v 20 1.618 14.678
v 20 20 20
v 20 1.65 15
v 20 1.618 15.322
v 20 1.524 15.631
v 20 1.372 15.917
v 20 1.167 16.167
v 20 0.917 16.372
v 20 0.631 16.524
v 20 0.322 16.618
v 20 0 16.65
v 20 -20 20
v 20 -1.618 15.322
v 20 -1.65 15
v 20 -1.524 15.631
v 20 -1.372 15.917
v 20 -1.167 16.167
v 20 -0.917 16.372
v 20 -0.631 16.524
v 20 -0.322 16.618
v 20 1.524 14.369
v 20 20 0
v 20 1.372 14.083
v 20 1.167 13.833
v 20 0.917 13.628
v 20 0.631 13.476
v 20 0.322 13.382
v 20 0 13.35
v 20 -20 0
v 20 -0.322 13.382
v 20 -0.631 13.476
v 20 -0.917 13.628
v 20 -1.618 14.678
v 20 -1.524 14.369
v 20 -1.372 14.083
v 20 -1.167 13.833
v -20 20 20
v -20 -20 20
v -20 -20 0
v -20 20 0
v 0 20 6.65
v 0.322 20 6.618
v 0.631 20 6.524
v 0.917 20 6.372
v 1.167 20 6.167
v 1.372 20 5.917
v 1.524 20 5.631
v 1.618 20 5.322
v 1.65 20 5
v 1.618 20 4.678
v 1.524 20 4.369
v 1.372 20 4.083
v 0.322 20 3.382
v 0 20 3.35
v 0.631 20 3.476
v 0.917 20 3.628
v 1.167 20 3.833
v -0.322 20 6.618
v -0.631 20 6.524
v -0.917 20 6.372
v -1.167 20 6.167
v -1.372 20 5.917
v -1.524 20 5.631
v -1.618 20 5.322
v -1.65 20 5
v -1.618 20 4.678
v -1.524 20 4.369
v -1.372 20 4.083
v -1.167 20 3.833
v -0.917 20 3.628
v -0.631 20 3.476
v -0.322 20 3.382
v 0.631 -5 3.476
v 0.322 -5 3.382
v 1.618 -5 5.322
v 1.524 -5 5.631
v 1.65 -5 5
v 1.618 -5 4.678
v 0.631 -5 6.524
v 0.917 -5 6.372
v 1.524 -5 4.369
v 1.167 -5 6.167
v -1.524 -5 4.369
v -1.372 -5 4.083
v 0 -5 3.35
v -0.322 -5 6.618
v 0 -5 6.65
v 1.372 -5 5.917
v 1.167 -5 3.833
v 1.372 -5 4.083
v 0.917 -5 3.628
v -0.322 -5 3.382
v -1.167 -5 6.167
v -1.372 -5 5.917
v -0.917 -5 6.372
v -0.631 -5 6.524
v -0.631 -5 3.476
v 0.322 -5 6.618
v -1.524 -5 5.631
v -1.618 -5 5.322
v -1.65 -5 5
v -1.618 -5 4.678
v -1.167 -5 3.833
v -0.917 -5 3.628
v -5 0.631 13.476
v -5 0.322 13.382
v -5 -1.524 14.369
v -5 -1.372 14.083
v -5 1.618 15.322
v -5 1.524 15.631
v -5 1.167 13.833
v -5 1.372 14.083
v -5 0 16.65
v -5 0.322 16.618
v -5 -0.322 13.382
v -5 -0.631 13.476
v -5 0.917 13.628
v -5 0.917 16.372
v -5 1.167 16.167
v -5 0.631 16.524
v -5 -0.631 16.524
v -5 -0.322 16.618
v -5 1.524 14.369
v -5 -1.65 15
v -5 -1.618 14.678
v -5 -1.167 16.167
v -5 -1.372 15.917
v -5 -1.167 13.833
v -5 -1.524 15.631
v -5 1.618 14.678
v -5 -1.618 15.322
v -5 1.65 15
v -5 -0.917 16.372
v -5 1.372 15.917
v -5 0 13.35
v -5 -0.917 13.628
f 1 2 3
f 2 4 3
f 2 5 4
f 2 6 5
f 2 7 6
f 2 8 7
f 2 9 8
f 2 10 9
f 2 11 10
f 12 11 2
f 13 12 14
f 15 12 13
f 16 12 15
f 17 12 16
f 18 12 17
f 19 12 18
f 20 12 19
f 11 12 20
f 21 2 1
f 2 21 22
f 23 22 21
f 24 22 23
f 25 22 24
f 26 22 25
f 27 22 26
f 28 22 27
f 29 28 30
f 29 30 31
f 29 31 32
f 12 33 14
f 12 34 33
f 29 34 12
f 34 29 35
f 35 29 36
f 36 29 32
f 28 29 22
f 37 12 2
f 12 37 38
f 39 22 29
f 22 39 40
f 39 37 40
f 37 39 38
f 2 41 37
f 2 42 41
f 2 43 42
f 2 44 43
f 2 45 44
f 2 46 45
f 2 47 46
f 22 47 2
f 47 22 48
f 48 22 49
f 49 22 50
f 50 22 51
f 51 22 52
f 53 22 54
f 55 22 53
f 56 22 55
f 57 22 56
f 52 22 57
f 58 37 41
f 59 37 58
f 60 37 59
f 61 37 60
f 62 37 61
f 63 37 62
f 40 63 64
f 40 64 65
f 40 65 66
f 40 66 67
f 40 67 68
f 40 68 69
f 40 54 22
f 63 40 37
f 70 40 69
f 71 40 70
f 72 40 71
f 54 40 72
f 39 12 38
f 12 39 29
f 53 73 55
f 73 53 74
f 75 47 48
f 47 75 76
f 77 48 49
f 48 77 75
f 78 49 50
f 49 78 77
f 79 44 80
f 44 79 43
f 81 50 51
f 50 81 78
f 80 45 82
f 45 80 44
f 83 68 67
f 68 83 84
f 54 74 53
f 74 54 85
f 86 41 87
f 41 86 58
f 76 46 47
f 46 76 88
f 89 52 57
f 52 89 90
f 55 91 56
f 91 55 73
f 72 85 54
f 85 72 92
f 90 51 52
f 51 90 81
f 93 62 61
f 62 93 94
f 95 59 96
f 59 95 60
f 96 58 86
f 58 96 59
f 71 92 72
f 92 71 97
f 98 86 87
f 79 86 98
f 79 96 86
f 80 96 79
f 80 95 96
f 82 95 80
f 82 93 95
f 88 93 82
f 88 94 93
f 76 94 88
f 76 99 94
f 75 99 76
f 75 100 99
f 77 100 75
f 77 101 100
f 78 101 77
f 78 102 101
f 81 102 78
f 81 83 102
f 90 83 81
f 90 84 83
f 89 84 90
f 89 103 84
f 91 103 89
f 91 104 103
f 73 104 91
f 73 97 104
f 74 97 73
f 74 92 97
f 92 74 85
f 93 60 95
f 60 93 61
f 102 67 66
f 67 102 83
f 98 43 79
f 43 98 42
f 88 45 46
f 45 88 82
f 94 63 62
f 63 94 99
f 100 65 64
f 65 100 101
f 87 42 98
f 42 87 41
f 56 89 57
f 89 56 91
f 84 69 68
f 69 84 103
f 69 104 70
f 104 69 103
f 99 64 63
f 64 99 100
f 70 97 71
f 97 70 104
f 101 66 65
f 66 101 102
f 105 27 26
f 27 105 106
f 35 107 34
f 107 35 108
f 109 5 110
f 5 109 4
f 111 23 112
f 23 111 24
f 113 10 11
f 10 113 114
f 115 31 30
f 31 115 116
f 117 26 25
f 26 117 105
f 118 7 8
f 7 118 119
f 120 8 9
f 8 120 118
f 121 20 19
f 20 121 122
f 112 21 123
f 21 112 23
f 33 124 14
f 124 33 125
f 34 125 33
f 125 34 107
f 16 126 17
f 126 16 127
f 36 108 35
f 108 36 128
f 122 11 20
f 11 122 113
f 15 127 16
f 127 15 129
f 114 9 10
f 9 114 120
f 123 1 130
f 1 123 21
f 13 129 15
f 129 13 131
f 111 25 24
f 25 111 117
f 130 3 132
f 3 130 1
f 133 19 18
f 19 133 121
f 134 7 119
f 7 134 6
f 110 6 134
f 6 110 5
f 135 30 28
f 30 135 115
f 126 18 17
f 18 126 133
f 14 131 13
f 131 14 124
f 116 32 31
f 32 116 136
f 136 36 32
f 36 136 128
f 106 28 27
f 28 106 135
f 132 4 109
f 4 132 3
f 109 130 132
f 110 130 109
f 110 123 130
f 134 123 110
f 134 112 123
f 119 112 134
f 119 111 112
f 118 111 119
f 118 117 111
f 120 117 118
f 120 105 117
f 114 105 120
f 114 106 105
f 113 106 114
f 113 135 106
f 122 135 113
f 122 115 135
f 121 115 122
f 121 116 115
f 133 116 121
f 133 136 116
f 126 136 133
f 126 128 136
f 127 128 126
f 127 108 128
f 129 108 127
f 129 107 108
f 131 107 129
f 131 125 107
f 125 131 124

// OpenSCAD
// 40x40x20 block the screws thread into; M4 pilots d3.3 from +Y face at z5 (x0) and a second along X at z5 (fail fixture) -- pass fixture screws the side one at z15
difference() {
    translate([-20, -20, 0]) cube([40, 40, 20]);
    translate([0, 21, 5]) rotate([90, 0, 0]) cylinder(d = 3.3, h = 26, $fn = 32);
    translate([21, 0, 15]) rotate([0, -90, 0]) cylinder(d = 3.3, h = 26, $fn = 32);
}
